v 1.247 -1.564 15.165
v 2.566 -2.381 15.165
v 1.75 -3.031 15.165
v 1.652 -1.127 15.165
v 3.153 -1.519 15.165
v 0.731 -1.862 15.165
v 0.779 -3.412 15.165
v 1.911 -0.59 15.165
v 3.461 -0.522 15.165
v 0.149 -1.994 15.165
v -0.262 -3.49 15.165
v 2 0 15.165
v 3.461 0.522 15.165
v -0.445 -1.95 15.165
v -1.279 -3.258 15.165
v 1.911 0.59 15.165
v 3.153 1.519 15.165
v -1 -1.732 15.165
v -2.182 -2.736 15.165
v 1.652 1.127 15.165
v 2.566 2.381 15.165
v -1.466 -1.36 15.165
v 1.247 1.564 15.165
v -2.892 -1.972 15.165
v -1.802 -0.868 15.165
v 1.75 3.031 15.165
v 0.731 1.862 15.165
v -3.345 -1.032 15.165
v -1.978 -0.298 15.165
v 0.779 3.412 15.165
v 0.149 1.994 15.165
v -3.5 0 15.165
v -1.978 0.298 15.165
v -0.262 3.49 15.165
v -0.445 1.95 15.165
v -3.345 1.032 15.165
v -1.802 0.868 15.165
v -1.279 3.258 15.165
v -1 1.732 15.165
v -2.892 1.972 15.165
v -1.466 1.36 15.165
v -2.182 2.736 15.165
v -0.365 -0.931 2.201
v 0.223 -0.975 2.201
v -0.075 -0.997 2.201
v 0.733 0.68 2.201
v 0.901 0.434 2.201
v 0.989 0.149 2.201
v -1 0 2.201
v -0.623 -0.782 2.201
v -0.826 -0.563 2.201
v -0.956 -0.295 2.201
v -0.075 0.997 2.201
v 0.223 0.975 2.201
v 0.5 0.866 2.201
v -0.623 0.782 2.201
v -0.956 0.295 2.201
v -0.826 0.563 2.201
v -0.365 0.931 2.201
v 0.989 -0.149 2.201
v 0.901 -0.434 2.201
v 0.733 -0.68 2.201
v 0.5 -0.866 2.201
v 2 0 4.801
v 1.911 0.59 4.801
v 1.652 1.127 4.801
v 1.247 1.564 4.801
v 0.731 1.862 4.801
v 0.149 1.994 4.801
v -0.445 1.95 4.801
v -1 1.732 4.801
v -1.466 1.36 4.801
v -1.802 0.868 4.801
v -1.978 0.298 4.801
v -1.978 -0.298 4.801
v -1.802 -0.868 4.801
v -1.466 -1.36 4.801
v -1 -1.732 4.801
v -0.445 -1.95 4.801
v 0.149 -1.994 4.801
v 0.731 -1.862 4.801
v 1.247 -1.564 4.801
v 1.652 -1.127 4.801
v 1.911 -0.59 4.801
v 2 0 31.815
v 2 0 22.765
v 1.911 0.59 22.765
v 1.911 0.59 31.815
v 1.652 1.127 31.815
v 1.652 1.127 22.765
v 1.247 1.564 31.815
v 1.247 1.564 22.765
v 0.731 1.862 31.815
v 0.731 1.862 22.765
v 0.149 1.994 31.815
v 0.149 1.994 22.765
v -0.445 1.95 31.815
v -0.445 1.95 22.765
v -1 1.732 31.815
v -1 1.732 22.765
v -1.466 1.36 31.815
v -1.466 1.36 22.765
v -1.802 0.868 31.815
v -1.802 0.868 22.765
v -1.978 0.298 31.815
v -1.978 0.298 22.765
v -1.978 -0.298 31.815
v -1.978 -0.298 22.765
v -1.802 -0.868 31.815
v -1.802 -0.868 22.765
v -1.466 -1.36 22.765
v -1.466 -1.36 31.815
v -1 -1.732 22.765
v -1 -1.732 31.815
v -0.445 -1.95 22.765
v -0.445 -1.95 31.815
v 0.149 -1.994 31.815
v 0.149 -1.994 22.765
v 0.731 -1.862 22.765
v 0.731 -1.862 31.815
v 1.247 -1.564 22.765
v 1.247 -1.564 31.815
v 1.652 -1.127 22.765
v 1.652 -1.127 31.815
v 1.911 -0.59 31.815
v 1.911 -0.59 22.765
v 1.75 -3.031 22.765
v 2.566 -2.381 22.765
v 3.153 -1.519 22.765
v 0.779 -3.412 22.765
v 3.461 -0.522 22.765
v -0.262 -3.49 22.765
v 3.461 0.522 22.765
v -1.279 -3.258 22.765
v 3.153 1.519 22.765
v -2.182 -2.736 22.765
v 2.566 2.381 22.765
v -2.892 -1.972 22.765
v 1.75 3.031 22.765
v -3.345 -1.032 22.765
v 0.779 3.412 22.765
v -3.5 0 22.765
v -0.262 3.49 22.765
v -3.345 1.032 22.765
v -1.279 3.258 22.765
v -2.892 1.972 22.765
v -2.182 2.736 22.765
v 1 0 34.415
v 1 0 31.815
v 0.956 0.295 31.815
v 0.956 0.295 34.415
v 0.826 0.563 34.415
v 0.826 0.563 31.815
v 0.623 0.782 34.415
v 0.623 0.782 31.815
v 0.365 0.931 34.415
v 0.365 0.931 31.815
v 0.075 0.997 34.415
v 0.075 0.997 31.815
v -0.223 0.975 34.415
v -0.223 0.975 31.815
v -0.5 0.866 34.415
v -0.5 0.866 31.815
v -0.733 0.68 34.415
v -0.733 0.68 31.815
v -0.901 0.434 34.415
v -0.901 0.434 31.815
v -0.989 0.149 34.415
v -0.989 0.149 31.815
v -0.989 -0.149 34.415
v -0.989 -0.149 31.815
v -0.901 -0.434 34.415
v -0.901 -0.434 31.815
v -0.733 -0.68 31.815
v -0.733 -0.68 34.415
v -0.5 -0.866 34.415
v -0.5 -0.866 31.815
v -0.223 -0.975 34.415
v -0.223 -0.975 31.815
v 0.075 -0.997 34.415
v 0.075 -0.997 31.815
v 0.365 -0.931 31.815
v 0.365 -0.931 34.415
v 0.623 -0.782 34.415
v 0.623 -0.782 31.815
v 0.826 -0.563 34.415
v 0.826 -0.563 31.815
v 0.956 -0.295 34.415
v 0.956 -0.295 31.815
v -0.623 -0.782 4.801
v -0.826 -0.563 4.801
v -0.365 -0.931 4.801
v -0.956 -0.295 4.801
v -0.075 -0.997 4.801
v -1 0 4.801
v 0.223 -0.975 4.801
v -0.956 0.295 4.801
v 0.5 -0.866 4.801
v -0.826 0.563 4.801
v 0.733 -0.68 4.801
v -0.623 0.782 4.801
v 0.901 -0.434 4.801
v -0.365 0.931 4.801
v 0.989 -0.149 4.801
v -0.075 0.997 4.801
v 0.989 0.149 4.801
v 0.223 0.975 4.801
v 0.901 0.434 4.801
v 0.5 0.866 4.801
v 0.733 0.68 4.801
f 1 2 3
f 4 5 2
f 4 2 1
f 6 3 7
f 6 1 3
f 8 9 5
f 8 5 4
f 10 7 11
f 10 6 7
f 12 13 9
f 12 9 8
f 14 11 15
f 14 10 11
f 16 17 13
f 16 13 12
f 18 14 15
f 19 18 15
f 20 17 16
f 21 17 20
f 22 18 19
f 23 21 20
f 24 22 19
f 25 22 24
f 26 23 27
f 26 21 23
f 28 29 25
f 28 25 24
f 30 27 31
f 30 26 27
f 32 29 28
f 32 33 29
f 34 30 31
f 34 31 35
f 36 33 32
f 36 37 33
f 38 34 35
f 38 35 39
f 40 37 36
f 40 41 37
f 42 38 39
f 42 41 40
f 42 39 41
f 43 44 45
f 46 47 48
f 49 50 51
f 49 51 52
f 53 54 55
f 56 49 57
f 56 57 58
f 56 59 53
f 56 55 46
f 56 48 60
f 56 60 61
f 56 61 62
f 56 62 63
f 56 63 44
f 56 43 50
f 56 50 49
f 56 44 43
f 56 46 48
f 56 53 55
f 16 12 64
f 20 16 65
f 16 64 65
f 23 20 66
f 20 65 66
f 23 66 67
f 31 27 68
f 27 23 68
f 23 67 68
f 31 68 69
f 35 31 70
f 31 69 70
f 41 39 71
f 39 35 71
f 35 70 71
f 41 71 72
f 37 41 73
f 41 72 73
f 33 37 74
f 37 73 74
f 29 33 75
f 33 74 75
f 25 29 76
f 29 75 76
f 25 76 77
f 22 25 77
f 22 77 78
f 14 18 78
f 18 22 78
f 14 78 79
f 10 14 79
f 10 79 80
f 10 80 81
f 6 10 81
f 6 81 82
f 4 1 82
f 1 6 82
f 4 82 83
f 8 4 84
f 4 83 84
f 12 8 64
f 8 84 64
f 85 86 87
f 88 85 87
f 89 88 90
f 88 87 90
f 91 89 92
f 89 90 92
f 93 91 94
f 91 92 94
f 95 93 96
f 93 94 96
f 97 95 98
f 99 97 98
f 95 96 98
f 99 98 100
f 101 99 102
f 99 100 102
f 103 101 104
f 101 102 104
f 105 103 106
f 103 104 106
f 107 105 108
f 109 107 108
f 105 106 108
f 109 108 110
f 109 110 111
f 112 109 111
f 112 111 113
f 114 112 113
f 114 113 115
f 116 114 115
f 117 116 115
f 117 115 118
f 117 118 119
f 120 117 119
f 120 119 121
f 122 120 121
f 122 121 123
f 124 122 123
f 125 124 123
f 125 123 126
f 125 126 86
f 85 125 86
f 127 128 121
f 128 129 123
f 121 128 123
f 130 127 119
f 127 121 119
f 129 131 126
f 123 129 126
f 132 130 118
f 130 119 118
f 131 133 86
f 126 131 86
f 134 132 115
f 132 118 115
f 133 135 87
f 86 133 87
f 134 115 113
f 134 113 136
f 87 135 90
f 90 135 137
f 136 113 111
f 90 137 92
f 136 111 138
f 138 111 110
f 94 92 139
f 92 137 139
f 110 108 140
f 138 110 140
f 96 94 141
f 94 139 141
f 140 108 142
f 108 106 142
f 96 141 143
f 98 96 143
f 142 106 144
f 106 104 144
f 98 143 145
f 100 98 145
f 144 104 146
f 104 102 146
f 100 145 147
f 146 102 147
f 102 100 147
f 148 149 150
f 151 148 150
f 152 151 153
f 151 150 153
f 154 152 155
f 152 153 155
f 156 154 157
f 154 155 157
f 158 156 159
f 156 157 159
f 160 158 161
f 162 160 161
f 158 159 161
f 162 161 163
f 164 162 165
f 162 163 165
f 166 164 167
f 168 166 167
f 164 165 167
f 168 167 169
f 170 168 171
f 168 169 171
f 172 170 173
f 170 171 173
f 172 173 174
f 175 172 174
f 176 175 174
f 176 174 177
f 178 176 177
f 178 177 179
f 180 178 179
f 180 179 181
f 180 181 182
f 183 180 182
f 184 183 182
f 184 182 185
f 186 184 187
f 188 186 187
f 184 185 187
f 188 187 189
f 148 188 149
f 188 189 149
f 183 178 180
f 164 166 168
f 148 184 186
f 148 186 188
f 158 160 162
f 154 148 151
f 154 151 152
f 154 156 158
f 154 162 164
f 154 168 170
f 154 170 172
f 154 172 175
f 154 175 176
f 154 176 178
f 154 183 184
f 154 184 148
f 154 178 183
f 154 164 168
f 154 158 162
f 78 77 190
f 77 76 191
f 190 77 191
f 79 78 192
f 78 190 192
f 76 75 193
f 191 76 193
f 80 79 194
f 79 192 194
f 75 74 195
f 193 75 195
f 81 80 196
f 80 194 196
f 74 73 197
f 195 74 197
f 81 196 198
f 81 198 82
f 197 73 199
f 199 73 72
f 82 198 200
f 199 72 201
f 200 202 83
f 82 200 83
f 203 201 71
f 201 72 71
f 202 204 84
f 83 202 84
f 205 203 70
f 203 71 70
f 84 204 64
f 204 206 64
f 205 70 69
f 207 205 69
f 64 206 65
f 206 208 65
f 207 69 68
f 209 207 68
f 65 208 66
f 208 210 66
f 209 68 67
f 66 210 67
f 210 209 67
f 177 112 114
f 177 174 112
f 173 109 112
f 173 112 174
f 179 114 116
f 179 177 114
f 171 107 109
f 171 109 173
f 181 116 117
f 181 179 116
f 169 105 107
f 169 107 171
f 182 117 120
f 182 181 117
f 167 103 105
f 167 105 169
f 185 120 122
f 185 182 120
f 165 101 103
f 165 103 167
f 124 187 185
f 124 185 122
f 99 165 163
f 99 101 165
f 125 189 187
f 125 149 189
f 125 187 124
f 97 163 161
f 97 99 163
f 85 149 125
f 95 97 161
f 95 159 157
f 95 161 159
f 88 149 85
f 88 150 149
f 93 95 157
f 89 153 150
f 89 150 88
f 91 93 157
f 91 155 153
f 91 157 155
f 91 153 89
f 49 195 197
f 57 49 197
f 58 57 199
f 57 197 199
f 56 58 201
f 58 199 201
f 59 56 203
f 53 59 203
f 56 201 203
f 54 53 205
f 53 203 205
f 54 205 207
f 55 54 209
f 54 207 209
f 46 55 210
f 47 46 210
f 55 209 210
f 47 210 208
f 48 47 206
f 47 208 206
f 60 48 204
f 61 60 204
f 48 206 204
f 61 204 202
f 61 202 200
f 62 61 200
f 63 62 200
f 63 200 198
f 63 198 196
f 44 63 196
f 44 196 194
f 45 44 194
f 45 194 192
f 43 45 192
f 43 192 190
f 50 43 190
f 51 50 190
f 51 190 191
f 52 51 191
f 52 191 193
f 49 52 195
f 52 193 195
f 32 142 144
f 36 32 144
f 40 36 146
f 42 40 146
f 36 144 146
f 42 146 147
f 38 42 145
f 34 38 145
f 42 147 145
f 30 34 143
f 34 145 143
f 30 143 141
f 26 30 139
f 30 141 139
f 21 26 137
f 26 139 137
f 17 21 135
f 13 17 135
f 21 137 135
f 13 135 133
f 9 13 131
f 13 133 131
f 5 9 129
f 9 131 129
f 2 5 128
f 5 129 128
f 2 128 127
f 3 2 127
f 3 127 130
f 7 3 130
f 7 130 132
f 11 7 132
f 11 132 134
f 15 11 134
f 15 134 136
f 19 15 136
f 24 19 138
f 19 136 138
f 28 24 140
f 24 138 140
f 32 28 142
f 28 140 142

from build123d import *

# Parameters (mm, degrees)
EXTRUDE_START   = 4.80128
SKETCH_1_R      = 2
EXTRUDE_1_DEPTH = 27.013538
SKETCH_2_R      = 1
EXTRUDE_2_DEPTH = 2.6
SKETCH_4_R      = 1
EXTRUDE_3_DEPTH = 2.6
EXTRUDE_START_2 = -17.963538
SKETCH_6_R      = 3.5
EXTRUDE_5_DEPTH = 7.6


with BuildPart() as part:
    # Эскиз1 → Бобышка-Вытянуть1 (new body)
    with BuildSketch(Plane.XY.offset(EXTRUDE_START)):
        Circle(SKETCH_1_R)
    extrude(amount=EXTRUDE_1_DEPTH)

    # Эскиз2 → Бобышка-Вытянуть2 (add)
    with BuildSketch(Plane.XY.offset(31.814817835)):
        Circle(SKETCH_2_R)
    extrude(amount=EXTRUDE_2_DEPTH)

    # Эскиз4 → Бобышка-Вытянуть3 (add)
    with BuildSketch(Plane(origin=(0, 0, 4.801280123), x_dir=(-1, 0, 0), z_dir=(0, 0, -1))):
        Circle(SKETCH_4_R)
    extrude(amount=EXTRUDE_3_DEPTH)

    # Эскиз6 → Бобышка-Вытянуть5 (add)
    with BuildSketch(Plane(origin=(0, 0, 4.801280123), x_dir=(-1, 0, 0), z_dir=(0, 0, -1)).offset(EXTRUDE_START_2)):
        Circle(SKETCH_6_R)
    extrude(amount=EXTRUDE_5_DEPTH)


solid = part.part
